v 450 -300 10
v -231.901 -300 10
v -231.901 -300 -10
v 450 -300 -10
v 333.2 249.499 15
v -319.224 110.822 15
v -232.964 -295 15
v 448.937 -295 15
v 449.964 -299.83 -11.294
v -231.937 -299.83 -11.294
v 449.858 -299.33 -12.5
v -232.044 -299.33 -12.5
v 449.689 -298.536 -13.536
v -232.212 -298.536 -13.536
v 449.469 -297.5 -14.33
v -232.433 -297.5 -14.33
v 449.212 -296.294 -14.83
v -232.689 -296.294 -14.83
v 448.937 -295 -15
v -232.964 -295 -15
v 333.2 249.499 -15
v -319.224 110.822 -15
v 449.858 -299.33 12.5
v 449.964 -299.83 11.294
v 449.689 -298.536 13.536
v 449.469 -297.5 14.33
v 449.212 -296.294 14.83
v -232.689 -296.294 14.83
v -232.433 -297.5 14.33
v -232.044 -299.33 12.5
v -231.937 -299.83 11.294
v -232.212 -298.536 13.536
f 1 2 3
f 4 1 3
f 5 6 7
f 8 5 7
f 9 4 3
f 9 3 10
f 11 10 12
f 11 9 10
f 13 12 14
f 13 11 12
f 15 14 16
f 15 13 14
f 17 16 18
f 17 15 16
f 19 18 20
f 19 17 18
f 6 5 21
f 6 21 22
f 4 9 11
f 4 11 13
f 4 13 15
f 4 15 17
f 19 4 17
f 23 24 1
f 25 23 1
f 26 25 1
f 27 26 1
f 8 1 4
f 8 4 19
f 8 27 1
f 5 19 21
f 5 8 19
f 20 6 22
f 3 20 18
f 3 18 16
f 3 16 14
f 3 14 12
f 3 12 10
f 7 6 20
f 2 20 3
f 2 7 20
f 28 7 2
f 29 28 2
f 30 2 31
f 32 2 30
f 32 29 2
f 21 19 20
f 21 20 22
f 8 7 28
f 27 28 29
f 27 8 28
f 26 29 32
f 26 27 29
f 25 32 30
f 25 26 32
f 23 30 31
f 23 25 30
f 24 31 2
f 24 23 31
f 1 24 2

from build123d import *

# Parameters (mm, degrees)
F2_DEPTH = 500
F3_DEPTH = 50


with BuildPart() as f2:
    # F0 (on Right) → F2 (new body, symmetric)
    with BuildSketch(Plane.YZ):
        with BuildLine():
            Line((300, -15), (300, 15))
            Line((300, 15), (-295, 15))
            ThreePointArc((-295, 15), (-298.535534, 13.535534), (-300, 10))
            Line((-300, 10), (-300, -10))
            ThreePointArc((-300, -10), (-298.535534, -13.535534), (-295, -15))
            Line((-295, -15), (300, -15))
        make_face()
    extrude(amount=F2_DEPTH, both=True)

    # F1 (on Top) → F3 (intersect, symmetric)
    with BuildSketch(Plane.XY):
        Polygon((-319.224087, 110.821992), (-189.972164, -497.260498), (462.452286, -358.5834), (333.200363, 249.49909), align=None)
    extrude(amount=F3_DEPTH, both=True, mode=Mode.INTERSECT)


solid = f2.part
